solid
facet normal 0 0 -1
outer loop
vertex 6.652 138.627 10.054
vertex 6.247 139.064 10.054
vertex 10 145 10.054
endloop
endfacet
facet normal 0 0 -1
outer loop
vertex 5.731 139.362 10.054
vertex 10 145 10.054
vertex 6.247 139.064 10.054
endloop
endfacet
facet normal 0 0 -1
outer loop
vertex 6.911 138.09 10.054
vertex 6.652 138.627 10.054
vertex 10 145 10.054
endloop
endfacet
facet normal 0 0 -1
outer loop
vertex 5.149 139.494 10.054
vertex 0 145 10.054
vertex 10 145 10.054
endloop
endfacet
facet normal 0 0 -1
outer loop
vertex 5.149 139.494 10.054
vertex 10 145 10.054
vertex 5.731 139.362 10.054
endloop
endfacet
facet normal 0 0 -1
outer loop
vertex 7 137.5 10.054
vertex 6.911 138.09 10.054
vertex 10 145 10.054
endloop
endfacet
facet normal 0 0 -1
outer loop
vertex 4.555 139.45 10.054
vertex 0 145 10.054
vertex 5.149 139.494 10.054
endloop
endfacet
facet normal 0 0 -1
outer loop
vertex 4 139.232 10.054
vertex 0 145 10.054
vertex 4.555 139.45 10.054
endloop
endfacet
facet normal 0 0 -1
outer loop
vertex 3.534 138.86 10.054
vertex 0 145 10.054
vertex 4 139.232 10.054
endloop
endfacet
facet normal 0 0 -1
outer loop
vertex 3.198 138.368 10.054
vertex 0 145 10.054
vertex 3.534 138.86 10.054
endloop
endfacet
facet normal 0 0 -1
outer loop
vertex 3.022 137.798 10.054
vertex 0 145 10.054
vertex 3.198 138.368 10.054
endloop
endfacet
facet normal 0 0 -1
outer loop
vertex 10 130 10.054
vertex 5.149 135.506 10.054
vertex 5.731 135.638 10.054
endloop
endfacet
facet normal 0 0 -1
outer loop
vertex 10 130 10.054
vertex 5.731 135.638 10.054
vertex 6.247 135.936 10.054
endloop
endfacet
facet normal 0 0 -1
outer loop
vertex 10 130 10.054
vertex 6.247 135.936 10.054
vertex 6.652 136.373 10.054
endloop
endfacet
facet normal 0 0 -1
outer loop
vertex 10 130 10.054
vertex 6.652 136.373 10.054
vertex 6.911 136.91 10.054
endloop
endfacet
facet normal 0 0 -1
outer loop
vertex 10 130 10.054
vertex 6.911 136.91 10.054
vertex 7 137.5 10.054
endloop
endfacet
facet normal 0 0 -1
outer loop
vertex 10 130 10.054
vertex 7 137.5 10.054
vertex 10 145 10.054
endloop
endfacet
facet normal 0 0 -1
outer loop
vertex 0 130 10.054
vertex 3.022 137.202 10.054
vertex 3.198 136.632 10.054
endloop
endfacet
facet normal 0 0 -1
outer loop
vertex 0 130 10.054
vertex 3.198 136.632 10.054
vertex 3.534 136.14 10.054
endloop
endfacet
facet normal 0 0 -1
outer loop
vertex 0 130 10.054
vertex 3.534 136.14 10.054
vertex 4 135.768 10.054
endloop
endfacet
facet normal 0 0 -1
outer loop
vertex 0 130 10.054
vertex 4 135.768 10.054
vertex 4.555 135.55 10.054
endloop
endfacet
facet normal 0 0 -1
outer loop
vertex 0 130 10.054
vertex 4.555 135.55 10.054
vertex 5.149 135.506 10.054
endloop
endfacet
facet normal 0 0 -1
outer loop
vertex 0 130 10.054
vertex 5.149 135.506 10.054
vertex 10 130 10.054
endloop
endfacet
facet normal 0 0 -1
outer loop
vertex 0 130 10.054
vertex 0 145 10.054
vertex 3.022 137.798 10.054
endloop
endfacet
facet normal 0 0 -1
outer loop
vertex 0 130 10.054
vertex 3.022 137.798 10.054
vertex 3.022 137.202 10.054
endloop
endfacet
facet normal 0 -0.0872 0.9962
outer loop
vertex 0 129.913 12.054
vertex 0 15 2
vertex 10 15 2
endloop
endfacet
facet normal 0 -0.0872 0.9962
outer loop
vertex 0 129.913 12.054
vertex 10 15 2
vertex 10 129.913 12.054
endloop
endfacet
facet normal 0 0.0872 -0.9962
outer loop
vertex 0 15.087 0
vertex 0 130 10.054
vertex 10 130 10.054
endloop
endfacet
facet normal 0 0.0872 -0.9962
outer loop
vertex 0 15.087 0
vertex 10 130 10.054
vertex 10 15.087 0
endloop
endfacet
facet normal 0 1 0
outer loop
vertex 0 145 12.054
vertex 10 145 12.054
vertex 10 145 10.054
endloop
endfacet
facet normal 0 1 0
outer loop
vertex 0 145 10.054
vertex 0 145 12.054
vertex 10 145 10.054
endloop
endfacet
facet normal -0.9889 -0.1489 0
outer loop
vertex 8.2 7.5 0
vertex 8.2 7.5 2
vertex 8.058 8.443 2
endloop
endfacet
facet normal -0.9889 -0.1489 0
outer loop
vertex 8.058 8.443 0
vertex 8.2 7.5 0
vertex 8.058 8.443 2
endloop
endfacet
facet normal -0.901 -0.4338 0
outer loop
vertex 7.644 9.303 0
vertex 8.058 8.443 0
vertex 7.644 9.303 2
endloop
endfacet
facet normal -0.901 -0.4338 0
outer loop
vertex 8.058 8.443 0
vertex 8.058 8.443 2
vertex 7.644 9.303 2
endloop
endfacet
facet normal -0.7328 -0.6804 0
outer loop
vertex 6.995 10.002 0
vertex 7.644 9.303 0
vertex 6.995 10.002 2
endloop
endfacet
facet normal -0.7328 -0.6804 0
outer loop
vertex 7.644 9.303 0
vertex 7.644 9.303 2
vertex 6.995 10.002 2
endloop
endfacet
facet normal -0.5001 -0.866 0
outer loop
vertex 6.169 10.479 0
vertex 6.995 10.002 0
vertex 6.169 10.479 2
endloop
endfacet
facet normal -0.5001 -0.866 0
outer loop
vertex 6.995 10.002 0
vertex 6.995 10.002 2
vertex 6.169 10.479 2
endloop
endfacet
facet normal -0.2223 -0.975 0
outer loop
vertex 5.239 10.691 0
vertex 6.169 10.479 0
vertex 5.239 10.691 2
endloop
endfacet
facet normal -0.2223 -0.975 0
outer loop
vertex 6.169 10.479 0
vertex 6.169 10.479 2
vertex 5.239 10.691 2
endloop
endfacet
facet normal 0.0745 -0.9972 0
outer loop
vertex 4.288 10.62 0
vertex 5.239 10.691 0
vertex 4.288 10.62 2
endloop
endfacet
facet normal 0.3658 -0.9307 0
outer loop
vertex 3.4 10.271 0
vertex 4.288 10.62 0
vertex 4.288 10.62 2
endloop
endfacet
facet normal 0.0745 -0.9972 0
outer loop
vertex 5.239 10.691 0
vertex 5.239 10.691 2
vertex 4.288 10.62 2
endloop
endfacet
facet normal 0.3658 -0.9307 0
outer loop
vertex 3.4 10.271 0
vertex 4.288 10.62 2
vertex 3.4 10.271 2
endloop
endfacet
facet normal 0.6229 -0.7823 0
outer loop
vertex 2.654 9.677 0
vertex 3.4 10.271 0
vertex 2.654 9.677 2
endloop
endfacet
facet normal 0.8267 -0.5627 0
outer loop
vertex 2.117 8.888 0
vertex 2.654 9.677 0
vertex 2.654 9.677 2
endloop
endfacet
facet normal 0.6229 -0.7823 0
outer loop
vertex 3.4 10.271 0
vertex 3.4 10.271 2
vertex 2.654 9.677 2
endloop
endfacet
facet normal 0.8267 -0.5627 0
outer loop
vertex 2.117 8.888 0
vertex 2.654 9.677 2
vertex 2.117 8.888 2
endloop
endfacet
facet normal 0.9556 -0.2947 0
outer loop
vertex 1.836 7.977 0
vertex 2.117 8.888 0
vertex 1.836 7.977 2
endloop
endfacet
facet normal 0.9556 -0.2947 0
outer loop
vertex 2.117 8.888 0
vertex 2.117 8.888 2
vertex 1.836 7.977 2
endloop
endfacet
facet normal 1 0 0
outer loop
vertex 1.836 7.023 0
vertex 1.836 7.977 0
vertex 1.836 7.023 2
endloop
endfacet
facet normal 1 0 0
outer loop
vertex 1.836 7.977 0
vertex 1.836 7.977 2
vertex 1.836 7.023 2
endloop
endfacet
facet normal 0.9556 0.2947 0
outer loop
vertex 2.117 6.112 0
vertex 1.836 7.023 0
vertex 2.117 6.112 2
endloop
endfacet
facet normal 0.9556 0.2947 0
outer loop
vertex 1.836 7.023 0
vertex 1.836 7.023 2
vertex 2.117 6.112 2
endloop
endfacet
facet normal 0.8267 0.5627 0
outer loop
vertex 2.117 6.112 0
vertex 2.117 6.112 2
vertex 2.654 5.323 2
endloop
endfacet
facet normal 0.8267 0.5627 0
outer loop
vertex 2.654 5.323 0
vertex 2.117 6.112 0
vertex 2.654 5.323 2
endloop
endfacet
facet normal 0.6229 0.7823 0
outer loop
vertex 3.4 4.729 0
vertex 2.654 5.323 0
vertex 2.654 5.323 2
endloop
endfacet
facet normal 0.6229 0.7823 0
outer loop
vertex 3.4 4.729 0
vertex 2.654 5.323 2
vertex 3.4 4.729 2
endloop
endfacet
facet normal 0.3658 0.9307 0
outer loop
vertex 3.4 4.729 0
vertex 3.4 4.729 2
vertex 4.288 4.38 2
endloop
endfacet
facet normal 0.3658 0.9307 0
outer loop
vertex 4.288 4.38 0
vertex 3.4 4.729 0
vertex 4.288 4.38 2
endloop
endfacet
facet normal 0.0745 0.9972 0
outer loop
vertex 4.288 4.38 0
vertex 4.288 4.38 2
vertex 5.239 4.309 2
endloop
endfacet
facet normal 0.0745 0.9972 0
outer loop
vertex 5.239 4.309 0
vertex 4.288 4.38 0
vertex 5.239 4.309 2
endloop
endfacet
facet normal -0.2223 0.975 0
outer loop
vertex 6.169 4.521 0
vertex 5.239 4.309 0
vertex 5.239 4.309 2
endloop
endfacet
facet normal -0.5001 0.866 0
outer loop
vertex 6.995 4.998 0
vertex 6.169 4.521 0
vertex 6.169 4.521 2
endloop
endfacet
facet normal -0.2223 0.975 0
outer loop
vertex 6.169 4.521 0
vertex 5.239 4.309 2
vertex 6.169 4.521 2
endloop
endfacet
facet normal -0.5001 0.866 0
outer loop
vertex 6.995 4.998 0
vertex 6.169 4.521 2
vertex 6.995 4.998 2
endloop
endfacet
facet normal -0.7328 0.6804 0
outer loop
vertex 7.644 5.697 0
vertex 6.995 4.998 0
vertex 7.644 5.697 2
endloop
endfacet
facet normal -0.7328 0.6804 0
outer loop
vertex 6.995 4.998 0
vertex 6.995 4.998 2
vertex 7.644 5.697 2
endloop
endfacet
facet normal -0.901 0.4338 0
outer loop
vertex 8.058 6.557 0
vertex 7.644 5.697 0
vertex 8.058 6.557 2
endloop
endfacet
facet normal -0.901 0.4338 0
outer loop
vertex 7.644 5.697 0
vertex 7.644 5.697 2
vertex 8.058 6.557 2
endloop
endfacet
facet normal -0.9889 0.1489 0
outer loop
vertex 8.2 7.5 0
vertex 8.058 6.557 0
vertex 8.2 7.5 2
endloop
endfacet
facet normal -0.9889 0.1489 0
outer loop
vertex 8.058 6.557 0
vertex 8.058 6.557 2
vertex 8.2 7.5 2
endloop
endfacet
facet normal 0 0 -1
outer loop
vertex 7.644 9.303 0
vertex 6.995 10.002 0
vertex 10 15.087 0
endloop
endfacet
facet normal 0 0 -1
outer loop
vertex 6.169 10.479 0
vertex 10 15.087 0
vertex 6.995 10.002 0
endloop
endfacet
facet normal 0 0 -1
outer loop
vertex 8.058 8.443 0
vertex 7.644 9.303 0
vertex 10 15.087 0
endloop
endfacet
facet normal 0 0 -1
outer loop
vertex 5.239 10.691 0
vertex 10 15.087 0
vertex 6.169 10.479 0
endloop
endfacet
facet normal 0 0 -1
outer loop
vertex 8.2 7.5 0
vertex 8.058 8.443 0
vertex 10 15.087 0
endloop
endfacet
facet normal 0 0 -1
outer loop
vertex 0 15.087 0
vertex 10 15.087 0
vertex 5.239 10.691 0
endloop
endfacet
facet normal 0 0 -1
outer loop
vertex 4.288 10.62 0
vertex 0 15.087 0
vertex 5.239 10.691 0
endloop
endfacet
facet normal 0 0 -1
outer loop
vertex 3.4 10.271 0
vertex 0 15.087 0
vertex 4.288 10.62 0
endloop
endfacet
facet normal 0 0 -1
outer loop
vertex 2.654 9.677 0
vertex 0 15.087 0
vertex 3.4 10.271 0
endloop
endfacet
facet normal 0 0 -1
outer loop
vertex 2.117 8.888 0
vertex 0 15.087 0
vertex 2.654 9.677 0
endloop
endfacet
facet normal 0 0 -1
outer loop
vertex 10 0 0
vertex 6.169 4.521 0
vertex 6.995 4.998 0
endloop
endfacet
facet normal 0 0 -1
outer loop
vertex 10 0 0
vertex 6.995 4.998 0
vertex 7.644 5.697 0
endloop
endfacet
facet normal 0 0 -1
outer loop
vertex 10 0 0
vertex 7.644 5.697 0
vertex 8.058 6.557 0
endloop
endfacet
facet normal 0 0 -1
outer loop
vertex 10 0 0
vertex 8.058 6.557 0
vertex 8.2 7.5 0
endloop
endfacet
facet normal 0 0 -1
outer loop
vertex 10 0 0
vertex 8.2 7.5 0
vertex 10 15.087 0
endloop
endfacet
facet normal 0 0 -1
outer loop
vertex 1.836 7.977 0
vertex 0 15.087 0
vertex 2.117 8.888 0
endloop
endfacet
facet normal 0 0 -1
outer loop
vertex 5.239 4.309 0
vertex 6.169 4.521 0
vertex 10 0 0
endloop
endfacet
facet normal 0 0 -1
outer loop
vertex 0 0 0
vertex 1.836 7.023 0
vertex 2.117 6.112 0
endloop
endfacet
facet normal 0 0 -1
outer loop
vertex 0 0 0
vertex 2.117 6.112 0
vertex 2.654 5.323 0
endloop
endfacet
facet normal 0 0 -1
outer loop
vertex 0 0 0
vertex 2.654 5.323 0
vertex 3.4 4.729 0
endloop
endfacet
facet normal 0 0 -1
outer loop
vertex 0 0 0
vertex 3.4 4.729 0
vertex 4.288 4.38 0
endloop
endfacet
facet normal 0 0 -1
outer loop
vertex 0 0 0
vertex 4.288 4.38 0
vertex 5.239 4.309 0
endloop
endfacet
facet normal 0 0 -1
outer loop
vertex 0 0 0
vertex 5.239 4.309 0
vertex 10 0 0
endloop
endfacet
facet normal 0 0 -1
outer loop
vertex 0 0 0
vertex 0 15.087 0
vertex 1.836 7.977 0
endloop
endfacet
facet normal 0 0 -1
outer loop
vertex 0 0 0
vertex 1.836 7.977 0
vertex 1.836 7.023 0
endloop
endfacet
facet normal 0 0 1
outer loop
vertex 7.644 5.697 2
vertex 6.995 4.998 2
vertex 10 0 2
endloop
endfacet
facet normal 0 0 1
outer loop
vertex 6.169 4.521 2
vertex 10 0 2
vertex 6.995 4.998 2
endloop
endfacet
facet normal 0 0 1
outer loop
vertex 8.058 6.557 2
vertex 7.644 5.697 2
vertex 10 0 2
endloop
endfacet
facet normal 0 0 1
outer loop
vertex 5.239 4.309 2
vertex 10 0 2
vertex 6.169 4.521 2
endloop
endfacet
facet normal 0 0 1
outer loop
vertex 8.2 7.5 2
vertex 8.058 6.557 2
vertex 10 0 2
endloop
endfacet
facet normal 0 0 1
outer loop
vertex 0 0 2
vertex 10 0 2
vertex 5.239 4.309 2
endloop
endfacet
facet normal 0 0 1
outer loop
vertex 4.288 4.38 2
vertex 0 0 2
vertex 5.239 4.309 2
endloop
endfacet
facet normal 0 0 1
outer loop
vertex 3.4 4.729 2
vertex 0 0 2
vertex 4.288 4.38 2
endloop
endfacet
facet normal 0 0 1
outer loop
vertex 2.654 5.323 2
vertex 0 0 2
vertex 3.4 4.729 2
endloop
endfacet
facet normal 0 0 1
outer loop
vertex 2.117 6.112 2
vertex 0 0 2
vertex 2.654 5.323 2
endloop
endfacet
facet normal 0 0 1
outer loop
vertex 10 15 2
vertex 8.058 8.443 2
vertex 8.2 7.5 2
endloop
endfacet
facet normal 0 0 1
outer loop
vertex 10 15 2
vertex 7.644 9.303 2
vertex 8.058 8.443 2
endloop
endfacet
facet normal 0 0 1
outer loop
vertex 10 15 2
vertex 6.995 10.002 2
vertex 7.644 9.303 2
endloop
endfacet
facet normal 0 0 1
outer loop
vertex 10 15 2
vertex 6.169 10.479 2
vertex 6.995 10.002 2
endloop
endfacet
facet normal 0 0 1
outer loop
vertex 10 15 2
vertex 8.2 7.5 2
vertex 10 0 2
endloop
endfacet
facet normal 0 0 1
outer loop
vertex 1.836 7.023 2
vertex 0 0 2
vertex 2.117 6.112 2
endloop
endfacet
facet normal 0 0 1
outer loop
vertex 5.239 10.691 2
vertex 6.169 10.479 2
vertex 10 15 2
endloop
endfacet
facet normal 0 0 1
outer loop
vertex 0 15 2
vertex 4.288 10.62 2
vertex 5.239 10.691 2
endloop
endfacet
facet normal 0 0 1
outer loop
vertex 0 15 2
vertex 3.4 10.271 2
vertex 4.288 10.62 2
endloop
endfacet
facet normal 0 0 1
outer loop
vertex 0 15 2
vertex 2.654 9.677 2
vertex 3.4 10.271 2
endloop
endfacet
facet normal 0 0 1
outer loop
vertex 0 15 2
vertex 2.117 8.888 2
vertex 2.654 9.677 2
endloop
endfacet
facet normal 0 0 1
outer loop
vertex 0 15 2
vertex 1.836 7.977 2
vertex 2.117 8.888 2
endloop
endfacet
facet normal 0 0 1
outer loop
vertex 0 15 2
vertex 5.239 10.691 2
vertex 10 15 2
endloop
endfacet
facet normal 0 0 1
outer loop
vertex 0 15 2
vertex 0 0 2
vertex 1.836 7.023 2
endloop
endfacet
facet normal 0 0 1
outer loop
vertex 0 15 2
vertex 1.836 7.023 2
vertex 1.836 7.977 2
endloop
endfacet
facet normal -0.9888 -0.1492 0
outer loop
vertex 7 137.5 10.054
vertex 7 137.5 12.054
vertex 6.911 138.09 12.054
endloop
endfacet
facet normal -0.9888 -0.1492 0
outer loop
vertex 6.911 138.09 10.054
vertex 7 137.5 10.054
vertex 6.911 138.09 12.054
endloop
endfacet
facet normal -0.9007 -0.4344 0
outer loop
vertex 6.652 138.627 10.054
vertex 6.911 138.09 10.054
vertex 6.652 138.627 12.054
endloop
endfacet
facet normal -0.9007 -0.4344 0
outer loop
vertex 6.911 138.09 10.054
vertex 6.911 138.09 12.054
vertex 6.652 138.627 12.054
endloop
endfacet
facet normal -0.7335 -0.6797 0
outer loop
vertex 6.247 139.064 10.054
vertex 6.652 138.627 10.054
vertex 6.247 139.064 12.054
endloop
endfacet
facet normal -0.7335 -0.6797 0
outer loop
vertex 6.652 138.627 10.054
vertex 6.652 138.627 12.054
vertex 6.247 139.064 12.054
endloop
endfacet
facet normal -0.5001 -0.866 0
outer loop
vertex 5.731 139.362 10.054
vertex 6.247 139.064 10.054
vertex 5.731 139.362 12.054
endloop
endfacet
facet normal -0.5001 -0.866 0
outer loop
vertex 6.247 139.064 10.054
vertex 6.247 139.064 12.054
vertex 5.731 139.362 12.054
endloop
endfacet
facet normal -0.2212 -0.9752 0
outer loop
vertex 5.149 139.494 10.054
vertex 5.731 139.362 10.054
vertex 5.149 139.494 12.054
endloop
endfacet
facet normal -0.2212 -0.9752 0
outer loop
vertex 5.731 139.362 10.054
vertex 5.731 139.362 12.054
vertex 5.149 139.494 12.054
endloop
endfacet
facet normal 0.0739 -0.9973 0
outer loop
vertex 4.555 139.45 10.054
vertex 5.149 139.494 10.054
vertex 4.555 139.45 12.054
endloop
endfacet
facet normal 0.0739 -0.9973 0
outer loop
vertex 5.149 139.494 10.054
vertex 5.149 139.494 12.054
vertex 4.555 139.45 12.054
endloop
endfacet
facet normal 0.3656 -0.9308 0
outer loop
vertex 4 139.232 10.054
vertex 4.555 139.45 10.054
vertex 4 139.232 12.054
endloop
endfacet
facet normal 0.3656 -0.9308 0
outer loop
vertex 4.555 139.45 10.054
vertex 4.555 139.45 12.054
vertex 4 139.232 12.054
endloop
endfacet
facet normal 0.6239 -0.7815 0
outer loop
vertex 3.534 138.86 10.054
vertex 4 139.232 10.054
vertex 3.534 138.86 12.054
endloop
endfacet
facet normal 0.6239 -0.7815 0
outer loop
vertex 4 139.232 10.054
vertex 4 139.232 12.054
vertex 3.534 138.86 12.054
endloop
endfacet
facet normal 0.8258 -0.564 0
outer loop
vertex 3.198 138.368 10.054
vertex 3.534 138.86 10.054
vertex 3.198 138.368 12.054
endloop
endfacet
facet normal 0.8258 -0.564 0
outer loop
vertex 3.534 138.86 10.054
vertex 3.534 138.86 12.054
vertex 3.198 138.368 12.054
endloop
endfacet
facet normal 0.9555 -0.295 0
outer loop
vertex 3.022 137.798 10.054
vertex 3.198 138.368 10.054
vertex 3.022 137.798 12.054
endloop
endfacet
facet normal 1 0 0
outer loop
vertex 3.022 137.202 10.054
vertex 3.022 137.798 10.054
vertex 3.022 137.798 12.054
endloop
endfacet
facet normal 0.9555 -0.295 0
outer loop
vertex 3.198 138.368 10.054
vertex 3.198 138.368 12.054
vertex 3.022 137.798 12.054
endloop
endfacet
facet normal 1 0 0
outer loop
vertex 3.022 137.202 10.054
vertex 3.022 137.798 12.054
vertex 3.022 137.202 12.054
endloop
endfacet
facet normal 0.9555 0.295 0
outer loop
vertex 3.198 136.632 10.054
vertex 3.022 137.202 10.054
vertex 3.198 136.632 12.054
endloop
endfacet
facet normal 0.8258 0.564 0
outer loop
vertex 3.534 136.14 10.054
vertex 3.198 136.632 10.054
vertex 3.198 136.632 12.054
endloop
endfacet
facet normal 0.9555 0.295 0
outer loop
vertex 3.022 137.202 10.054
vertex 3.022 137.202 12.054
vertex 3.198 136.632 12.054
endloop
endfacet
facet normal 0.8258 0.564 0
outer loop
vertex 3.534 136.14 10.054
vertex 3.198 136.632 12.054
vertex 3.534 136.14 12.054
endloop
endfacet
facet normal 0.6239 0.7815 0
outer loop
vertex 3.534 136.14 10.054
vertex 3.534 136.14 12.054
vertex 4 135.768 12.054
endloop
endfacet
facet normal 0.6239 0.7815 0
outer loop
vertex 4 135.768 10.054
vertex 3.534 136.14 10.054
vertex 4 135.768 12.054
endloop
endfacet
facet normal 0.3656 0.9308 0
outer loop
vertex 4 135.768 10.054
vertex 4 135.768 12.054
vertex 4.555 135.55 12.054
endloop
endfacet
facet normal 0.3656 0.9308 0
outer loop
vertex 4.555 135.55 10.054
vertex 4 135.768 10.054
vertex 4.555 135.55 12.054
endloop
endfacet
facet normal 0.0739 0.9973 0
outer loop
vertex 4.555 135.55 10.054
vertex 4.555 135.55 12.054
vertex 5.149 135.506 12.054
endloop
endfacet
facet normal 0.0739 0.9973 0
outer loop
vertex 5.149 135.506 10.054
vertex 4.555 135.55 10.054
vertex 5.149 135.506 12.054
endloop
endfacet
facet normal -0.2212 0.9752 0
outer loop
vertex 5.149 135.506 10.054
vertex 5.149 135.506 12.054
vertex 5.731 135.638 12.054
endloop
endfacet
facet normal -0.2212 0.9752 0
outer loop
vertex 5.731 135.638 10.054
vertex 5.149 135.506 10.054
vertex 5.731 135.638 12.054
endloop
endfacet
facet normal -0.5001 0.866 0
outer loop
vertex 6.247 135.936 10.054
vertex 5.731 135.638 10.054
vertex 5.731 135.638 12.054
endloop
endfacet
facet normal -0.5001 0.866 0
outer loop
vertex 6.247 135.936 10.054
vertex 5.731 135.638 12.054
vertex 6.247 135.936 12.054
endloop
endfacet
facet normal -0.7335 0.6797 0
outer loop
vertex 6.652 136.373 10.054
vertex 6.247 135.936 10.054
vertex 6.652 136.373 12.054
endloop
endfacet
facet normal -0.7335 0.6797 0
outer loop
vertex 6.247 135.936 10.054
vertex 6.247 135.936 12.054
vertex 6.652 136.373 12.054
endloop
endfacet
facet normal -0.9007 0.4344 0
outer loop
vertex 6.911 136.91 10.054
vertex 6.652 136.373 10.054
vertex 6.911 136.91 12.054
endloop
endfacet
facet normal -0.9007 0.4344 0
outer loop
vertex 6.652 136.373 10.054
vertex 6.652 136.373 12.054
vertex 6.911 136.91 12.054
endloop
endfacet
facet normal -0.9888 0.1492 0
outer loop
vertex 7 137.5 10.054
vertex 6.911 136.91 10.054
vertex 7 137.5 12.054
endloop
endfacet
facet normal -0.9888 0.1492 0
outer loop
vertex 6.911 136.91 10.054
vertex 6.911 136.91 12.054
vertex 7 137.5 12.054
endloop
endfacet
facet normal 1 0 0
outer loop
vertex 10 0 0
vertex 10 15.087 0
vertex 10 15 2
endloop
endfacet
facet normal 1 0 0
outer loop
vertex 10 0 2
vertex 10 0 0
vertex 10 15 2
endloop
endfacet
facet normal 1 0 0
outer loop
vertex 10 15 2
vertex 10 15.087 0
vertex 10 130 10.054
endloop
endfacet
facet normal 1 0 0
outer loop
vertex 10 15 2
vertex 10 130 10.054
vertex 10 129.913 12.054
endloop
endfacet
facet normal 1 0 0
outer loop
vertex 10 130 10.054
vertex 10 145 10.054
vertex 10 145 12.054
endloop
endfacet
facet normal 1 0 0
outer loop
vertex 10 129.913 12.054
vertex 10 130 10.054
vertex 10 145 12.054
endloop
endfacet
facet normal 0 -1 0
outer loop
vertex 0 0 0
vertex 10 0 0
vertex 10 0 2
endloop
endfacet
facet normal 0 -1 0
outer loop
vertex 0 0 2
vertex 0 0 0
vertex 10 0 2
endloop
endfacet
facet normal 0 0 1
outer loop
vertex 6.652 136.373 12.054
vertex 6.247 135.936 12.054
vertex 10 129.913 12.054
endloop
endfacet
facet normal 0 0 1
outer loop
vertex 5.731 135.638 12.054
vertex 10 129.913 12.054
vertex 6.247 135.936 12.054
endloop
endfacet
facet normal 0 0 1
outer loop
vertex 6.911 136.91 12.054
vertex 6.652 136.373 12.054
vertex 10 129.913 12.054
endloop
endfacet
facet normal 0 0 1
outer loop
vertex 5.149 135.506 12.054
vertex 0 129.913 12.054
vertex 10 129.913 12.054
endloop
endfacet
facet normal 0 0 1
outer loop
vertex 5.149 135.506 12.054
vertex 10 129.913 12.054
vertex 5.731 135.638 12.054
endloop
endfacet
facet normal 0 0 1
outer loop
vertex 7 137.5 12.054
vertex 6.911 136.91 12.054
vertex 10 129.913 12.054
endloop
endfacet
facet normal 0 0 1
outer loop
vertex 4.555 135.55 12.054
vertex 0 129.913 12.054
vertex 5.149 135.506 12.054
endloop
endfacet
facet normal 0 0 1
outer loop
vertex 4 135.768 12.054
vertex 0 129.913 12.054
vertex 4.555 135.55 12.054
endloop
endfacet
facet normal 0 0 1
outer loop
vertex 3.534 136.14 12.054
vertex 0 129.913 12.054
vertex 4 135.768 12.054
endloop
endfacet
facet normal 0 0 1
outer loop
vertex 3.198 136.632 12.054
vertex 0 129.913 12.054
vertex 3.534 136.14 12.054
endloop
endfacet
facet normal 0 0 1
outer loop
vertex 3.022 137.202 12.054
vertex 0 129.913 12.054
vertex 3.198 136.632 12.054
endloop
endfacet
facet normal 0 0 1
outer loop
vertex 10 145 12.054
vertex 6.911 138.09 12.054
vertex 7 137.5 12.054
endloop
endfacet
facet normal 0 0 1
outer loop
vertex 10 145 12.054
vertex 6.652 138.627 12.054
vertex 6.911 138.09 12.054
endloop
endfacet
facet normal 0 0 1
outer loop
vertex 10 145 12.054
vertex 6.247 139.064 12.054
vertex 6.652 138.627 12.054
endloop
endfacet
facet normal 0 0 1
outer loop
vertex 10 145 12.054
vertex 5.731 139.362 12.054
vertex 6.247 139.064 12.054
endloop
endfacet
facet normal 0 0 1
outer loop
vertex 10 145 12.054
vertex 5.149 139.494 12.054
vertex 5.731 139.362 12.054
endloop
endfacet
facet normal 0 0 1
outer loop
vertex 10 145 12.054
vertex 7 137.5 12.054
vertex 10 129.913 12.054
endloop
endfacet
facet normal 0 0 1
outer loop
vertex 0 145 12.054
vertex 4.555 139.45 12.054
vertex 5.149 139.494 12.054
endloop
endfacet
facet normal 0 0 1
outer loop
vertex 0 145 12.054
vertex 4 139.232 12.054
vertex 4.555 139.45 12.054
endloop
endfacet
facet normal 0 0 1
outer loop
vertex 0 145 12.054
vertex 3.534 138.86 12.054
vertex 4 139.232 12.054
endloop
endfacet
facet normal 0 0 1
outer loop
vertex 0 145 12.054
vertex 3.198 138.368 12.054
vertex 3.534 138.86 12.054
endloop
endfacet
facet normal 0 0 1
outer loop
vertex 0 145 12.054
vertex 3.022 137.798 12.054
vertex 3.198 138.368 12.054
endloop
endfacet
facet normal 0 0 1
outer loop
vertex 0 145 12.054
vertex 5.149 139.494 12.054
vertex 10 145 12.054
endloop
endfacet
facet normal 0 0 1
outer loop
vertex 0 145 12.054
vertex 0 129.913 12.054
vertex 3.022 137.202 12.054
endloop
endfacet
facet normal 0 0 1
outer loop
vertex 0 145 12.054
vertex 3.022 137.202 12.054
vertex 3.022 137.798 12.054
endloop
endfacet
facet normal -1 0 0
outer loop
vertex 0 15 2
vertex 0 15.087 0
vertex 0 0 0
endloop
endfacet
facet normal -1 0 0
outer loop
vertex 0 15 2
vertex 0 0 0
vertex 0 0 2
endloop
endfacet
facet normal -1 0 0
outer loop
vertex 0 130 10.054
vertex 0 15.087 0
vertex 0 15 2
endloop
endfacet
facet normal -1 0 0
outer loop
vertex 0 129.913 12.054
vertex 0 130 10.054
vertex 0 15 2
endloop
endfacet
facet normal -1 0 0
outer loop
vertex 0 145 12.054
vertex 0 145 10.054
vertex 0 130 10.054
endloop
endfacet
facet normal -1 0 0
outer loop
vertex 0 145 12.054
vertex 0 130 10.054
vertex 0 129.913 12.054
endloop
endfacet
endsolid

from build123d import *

# Parameters (mm, degrees)
BOSS_EXTRUDE1_DEPTH = 10
SKETCH3_R           = 3.2
CUT_EXTRUDE1_DEPTH  = 2
SKETCH4_R           = 2
CUT_EXTRUDE2_DEPTH  = 2


with BuildPart() as part:
    # Sketch2 → Boss-Extrude1 (new body)
    with BuildSketch(Plane(origin=(0, 0, 0), x_dir=(0, 0, -1), z_dir=(1, 0, 0))):
        Polygon((-10.05355663, 145), (-10.05355663, 130), (0, 15.087321886), (0, 0), (-2, 0), (-2, 15), (-12.05355663, 129.912678114), (-12.05355663, 145), align=None)
    extrude(amount=BOSS_EXTRUDE1_DEPTH)

    # Sketch3 → Cut-Extrude1 (cut)
    with BuildSketch(Plane.XY.offset(2)):
        with Locations((5, 7.5)):
            Circle(SKETCH3_R)
    extrude(amount=-CUT_EXTRUDE1_DEPTH, mode=Mode.SUBTRACT)

    # Sketch4 → Cut-Extrude2 (cut)
    with BuildSketch(Plane.XY.offset(12.05355663)):
        with Locations((5, 137.5)):
            Circle(SKETCH4_R)
    extrude(amount=-CUT_EXTRUDE2_DEPTH, mode=Mode.SUBTRACT)


solid = part.part
